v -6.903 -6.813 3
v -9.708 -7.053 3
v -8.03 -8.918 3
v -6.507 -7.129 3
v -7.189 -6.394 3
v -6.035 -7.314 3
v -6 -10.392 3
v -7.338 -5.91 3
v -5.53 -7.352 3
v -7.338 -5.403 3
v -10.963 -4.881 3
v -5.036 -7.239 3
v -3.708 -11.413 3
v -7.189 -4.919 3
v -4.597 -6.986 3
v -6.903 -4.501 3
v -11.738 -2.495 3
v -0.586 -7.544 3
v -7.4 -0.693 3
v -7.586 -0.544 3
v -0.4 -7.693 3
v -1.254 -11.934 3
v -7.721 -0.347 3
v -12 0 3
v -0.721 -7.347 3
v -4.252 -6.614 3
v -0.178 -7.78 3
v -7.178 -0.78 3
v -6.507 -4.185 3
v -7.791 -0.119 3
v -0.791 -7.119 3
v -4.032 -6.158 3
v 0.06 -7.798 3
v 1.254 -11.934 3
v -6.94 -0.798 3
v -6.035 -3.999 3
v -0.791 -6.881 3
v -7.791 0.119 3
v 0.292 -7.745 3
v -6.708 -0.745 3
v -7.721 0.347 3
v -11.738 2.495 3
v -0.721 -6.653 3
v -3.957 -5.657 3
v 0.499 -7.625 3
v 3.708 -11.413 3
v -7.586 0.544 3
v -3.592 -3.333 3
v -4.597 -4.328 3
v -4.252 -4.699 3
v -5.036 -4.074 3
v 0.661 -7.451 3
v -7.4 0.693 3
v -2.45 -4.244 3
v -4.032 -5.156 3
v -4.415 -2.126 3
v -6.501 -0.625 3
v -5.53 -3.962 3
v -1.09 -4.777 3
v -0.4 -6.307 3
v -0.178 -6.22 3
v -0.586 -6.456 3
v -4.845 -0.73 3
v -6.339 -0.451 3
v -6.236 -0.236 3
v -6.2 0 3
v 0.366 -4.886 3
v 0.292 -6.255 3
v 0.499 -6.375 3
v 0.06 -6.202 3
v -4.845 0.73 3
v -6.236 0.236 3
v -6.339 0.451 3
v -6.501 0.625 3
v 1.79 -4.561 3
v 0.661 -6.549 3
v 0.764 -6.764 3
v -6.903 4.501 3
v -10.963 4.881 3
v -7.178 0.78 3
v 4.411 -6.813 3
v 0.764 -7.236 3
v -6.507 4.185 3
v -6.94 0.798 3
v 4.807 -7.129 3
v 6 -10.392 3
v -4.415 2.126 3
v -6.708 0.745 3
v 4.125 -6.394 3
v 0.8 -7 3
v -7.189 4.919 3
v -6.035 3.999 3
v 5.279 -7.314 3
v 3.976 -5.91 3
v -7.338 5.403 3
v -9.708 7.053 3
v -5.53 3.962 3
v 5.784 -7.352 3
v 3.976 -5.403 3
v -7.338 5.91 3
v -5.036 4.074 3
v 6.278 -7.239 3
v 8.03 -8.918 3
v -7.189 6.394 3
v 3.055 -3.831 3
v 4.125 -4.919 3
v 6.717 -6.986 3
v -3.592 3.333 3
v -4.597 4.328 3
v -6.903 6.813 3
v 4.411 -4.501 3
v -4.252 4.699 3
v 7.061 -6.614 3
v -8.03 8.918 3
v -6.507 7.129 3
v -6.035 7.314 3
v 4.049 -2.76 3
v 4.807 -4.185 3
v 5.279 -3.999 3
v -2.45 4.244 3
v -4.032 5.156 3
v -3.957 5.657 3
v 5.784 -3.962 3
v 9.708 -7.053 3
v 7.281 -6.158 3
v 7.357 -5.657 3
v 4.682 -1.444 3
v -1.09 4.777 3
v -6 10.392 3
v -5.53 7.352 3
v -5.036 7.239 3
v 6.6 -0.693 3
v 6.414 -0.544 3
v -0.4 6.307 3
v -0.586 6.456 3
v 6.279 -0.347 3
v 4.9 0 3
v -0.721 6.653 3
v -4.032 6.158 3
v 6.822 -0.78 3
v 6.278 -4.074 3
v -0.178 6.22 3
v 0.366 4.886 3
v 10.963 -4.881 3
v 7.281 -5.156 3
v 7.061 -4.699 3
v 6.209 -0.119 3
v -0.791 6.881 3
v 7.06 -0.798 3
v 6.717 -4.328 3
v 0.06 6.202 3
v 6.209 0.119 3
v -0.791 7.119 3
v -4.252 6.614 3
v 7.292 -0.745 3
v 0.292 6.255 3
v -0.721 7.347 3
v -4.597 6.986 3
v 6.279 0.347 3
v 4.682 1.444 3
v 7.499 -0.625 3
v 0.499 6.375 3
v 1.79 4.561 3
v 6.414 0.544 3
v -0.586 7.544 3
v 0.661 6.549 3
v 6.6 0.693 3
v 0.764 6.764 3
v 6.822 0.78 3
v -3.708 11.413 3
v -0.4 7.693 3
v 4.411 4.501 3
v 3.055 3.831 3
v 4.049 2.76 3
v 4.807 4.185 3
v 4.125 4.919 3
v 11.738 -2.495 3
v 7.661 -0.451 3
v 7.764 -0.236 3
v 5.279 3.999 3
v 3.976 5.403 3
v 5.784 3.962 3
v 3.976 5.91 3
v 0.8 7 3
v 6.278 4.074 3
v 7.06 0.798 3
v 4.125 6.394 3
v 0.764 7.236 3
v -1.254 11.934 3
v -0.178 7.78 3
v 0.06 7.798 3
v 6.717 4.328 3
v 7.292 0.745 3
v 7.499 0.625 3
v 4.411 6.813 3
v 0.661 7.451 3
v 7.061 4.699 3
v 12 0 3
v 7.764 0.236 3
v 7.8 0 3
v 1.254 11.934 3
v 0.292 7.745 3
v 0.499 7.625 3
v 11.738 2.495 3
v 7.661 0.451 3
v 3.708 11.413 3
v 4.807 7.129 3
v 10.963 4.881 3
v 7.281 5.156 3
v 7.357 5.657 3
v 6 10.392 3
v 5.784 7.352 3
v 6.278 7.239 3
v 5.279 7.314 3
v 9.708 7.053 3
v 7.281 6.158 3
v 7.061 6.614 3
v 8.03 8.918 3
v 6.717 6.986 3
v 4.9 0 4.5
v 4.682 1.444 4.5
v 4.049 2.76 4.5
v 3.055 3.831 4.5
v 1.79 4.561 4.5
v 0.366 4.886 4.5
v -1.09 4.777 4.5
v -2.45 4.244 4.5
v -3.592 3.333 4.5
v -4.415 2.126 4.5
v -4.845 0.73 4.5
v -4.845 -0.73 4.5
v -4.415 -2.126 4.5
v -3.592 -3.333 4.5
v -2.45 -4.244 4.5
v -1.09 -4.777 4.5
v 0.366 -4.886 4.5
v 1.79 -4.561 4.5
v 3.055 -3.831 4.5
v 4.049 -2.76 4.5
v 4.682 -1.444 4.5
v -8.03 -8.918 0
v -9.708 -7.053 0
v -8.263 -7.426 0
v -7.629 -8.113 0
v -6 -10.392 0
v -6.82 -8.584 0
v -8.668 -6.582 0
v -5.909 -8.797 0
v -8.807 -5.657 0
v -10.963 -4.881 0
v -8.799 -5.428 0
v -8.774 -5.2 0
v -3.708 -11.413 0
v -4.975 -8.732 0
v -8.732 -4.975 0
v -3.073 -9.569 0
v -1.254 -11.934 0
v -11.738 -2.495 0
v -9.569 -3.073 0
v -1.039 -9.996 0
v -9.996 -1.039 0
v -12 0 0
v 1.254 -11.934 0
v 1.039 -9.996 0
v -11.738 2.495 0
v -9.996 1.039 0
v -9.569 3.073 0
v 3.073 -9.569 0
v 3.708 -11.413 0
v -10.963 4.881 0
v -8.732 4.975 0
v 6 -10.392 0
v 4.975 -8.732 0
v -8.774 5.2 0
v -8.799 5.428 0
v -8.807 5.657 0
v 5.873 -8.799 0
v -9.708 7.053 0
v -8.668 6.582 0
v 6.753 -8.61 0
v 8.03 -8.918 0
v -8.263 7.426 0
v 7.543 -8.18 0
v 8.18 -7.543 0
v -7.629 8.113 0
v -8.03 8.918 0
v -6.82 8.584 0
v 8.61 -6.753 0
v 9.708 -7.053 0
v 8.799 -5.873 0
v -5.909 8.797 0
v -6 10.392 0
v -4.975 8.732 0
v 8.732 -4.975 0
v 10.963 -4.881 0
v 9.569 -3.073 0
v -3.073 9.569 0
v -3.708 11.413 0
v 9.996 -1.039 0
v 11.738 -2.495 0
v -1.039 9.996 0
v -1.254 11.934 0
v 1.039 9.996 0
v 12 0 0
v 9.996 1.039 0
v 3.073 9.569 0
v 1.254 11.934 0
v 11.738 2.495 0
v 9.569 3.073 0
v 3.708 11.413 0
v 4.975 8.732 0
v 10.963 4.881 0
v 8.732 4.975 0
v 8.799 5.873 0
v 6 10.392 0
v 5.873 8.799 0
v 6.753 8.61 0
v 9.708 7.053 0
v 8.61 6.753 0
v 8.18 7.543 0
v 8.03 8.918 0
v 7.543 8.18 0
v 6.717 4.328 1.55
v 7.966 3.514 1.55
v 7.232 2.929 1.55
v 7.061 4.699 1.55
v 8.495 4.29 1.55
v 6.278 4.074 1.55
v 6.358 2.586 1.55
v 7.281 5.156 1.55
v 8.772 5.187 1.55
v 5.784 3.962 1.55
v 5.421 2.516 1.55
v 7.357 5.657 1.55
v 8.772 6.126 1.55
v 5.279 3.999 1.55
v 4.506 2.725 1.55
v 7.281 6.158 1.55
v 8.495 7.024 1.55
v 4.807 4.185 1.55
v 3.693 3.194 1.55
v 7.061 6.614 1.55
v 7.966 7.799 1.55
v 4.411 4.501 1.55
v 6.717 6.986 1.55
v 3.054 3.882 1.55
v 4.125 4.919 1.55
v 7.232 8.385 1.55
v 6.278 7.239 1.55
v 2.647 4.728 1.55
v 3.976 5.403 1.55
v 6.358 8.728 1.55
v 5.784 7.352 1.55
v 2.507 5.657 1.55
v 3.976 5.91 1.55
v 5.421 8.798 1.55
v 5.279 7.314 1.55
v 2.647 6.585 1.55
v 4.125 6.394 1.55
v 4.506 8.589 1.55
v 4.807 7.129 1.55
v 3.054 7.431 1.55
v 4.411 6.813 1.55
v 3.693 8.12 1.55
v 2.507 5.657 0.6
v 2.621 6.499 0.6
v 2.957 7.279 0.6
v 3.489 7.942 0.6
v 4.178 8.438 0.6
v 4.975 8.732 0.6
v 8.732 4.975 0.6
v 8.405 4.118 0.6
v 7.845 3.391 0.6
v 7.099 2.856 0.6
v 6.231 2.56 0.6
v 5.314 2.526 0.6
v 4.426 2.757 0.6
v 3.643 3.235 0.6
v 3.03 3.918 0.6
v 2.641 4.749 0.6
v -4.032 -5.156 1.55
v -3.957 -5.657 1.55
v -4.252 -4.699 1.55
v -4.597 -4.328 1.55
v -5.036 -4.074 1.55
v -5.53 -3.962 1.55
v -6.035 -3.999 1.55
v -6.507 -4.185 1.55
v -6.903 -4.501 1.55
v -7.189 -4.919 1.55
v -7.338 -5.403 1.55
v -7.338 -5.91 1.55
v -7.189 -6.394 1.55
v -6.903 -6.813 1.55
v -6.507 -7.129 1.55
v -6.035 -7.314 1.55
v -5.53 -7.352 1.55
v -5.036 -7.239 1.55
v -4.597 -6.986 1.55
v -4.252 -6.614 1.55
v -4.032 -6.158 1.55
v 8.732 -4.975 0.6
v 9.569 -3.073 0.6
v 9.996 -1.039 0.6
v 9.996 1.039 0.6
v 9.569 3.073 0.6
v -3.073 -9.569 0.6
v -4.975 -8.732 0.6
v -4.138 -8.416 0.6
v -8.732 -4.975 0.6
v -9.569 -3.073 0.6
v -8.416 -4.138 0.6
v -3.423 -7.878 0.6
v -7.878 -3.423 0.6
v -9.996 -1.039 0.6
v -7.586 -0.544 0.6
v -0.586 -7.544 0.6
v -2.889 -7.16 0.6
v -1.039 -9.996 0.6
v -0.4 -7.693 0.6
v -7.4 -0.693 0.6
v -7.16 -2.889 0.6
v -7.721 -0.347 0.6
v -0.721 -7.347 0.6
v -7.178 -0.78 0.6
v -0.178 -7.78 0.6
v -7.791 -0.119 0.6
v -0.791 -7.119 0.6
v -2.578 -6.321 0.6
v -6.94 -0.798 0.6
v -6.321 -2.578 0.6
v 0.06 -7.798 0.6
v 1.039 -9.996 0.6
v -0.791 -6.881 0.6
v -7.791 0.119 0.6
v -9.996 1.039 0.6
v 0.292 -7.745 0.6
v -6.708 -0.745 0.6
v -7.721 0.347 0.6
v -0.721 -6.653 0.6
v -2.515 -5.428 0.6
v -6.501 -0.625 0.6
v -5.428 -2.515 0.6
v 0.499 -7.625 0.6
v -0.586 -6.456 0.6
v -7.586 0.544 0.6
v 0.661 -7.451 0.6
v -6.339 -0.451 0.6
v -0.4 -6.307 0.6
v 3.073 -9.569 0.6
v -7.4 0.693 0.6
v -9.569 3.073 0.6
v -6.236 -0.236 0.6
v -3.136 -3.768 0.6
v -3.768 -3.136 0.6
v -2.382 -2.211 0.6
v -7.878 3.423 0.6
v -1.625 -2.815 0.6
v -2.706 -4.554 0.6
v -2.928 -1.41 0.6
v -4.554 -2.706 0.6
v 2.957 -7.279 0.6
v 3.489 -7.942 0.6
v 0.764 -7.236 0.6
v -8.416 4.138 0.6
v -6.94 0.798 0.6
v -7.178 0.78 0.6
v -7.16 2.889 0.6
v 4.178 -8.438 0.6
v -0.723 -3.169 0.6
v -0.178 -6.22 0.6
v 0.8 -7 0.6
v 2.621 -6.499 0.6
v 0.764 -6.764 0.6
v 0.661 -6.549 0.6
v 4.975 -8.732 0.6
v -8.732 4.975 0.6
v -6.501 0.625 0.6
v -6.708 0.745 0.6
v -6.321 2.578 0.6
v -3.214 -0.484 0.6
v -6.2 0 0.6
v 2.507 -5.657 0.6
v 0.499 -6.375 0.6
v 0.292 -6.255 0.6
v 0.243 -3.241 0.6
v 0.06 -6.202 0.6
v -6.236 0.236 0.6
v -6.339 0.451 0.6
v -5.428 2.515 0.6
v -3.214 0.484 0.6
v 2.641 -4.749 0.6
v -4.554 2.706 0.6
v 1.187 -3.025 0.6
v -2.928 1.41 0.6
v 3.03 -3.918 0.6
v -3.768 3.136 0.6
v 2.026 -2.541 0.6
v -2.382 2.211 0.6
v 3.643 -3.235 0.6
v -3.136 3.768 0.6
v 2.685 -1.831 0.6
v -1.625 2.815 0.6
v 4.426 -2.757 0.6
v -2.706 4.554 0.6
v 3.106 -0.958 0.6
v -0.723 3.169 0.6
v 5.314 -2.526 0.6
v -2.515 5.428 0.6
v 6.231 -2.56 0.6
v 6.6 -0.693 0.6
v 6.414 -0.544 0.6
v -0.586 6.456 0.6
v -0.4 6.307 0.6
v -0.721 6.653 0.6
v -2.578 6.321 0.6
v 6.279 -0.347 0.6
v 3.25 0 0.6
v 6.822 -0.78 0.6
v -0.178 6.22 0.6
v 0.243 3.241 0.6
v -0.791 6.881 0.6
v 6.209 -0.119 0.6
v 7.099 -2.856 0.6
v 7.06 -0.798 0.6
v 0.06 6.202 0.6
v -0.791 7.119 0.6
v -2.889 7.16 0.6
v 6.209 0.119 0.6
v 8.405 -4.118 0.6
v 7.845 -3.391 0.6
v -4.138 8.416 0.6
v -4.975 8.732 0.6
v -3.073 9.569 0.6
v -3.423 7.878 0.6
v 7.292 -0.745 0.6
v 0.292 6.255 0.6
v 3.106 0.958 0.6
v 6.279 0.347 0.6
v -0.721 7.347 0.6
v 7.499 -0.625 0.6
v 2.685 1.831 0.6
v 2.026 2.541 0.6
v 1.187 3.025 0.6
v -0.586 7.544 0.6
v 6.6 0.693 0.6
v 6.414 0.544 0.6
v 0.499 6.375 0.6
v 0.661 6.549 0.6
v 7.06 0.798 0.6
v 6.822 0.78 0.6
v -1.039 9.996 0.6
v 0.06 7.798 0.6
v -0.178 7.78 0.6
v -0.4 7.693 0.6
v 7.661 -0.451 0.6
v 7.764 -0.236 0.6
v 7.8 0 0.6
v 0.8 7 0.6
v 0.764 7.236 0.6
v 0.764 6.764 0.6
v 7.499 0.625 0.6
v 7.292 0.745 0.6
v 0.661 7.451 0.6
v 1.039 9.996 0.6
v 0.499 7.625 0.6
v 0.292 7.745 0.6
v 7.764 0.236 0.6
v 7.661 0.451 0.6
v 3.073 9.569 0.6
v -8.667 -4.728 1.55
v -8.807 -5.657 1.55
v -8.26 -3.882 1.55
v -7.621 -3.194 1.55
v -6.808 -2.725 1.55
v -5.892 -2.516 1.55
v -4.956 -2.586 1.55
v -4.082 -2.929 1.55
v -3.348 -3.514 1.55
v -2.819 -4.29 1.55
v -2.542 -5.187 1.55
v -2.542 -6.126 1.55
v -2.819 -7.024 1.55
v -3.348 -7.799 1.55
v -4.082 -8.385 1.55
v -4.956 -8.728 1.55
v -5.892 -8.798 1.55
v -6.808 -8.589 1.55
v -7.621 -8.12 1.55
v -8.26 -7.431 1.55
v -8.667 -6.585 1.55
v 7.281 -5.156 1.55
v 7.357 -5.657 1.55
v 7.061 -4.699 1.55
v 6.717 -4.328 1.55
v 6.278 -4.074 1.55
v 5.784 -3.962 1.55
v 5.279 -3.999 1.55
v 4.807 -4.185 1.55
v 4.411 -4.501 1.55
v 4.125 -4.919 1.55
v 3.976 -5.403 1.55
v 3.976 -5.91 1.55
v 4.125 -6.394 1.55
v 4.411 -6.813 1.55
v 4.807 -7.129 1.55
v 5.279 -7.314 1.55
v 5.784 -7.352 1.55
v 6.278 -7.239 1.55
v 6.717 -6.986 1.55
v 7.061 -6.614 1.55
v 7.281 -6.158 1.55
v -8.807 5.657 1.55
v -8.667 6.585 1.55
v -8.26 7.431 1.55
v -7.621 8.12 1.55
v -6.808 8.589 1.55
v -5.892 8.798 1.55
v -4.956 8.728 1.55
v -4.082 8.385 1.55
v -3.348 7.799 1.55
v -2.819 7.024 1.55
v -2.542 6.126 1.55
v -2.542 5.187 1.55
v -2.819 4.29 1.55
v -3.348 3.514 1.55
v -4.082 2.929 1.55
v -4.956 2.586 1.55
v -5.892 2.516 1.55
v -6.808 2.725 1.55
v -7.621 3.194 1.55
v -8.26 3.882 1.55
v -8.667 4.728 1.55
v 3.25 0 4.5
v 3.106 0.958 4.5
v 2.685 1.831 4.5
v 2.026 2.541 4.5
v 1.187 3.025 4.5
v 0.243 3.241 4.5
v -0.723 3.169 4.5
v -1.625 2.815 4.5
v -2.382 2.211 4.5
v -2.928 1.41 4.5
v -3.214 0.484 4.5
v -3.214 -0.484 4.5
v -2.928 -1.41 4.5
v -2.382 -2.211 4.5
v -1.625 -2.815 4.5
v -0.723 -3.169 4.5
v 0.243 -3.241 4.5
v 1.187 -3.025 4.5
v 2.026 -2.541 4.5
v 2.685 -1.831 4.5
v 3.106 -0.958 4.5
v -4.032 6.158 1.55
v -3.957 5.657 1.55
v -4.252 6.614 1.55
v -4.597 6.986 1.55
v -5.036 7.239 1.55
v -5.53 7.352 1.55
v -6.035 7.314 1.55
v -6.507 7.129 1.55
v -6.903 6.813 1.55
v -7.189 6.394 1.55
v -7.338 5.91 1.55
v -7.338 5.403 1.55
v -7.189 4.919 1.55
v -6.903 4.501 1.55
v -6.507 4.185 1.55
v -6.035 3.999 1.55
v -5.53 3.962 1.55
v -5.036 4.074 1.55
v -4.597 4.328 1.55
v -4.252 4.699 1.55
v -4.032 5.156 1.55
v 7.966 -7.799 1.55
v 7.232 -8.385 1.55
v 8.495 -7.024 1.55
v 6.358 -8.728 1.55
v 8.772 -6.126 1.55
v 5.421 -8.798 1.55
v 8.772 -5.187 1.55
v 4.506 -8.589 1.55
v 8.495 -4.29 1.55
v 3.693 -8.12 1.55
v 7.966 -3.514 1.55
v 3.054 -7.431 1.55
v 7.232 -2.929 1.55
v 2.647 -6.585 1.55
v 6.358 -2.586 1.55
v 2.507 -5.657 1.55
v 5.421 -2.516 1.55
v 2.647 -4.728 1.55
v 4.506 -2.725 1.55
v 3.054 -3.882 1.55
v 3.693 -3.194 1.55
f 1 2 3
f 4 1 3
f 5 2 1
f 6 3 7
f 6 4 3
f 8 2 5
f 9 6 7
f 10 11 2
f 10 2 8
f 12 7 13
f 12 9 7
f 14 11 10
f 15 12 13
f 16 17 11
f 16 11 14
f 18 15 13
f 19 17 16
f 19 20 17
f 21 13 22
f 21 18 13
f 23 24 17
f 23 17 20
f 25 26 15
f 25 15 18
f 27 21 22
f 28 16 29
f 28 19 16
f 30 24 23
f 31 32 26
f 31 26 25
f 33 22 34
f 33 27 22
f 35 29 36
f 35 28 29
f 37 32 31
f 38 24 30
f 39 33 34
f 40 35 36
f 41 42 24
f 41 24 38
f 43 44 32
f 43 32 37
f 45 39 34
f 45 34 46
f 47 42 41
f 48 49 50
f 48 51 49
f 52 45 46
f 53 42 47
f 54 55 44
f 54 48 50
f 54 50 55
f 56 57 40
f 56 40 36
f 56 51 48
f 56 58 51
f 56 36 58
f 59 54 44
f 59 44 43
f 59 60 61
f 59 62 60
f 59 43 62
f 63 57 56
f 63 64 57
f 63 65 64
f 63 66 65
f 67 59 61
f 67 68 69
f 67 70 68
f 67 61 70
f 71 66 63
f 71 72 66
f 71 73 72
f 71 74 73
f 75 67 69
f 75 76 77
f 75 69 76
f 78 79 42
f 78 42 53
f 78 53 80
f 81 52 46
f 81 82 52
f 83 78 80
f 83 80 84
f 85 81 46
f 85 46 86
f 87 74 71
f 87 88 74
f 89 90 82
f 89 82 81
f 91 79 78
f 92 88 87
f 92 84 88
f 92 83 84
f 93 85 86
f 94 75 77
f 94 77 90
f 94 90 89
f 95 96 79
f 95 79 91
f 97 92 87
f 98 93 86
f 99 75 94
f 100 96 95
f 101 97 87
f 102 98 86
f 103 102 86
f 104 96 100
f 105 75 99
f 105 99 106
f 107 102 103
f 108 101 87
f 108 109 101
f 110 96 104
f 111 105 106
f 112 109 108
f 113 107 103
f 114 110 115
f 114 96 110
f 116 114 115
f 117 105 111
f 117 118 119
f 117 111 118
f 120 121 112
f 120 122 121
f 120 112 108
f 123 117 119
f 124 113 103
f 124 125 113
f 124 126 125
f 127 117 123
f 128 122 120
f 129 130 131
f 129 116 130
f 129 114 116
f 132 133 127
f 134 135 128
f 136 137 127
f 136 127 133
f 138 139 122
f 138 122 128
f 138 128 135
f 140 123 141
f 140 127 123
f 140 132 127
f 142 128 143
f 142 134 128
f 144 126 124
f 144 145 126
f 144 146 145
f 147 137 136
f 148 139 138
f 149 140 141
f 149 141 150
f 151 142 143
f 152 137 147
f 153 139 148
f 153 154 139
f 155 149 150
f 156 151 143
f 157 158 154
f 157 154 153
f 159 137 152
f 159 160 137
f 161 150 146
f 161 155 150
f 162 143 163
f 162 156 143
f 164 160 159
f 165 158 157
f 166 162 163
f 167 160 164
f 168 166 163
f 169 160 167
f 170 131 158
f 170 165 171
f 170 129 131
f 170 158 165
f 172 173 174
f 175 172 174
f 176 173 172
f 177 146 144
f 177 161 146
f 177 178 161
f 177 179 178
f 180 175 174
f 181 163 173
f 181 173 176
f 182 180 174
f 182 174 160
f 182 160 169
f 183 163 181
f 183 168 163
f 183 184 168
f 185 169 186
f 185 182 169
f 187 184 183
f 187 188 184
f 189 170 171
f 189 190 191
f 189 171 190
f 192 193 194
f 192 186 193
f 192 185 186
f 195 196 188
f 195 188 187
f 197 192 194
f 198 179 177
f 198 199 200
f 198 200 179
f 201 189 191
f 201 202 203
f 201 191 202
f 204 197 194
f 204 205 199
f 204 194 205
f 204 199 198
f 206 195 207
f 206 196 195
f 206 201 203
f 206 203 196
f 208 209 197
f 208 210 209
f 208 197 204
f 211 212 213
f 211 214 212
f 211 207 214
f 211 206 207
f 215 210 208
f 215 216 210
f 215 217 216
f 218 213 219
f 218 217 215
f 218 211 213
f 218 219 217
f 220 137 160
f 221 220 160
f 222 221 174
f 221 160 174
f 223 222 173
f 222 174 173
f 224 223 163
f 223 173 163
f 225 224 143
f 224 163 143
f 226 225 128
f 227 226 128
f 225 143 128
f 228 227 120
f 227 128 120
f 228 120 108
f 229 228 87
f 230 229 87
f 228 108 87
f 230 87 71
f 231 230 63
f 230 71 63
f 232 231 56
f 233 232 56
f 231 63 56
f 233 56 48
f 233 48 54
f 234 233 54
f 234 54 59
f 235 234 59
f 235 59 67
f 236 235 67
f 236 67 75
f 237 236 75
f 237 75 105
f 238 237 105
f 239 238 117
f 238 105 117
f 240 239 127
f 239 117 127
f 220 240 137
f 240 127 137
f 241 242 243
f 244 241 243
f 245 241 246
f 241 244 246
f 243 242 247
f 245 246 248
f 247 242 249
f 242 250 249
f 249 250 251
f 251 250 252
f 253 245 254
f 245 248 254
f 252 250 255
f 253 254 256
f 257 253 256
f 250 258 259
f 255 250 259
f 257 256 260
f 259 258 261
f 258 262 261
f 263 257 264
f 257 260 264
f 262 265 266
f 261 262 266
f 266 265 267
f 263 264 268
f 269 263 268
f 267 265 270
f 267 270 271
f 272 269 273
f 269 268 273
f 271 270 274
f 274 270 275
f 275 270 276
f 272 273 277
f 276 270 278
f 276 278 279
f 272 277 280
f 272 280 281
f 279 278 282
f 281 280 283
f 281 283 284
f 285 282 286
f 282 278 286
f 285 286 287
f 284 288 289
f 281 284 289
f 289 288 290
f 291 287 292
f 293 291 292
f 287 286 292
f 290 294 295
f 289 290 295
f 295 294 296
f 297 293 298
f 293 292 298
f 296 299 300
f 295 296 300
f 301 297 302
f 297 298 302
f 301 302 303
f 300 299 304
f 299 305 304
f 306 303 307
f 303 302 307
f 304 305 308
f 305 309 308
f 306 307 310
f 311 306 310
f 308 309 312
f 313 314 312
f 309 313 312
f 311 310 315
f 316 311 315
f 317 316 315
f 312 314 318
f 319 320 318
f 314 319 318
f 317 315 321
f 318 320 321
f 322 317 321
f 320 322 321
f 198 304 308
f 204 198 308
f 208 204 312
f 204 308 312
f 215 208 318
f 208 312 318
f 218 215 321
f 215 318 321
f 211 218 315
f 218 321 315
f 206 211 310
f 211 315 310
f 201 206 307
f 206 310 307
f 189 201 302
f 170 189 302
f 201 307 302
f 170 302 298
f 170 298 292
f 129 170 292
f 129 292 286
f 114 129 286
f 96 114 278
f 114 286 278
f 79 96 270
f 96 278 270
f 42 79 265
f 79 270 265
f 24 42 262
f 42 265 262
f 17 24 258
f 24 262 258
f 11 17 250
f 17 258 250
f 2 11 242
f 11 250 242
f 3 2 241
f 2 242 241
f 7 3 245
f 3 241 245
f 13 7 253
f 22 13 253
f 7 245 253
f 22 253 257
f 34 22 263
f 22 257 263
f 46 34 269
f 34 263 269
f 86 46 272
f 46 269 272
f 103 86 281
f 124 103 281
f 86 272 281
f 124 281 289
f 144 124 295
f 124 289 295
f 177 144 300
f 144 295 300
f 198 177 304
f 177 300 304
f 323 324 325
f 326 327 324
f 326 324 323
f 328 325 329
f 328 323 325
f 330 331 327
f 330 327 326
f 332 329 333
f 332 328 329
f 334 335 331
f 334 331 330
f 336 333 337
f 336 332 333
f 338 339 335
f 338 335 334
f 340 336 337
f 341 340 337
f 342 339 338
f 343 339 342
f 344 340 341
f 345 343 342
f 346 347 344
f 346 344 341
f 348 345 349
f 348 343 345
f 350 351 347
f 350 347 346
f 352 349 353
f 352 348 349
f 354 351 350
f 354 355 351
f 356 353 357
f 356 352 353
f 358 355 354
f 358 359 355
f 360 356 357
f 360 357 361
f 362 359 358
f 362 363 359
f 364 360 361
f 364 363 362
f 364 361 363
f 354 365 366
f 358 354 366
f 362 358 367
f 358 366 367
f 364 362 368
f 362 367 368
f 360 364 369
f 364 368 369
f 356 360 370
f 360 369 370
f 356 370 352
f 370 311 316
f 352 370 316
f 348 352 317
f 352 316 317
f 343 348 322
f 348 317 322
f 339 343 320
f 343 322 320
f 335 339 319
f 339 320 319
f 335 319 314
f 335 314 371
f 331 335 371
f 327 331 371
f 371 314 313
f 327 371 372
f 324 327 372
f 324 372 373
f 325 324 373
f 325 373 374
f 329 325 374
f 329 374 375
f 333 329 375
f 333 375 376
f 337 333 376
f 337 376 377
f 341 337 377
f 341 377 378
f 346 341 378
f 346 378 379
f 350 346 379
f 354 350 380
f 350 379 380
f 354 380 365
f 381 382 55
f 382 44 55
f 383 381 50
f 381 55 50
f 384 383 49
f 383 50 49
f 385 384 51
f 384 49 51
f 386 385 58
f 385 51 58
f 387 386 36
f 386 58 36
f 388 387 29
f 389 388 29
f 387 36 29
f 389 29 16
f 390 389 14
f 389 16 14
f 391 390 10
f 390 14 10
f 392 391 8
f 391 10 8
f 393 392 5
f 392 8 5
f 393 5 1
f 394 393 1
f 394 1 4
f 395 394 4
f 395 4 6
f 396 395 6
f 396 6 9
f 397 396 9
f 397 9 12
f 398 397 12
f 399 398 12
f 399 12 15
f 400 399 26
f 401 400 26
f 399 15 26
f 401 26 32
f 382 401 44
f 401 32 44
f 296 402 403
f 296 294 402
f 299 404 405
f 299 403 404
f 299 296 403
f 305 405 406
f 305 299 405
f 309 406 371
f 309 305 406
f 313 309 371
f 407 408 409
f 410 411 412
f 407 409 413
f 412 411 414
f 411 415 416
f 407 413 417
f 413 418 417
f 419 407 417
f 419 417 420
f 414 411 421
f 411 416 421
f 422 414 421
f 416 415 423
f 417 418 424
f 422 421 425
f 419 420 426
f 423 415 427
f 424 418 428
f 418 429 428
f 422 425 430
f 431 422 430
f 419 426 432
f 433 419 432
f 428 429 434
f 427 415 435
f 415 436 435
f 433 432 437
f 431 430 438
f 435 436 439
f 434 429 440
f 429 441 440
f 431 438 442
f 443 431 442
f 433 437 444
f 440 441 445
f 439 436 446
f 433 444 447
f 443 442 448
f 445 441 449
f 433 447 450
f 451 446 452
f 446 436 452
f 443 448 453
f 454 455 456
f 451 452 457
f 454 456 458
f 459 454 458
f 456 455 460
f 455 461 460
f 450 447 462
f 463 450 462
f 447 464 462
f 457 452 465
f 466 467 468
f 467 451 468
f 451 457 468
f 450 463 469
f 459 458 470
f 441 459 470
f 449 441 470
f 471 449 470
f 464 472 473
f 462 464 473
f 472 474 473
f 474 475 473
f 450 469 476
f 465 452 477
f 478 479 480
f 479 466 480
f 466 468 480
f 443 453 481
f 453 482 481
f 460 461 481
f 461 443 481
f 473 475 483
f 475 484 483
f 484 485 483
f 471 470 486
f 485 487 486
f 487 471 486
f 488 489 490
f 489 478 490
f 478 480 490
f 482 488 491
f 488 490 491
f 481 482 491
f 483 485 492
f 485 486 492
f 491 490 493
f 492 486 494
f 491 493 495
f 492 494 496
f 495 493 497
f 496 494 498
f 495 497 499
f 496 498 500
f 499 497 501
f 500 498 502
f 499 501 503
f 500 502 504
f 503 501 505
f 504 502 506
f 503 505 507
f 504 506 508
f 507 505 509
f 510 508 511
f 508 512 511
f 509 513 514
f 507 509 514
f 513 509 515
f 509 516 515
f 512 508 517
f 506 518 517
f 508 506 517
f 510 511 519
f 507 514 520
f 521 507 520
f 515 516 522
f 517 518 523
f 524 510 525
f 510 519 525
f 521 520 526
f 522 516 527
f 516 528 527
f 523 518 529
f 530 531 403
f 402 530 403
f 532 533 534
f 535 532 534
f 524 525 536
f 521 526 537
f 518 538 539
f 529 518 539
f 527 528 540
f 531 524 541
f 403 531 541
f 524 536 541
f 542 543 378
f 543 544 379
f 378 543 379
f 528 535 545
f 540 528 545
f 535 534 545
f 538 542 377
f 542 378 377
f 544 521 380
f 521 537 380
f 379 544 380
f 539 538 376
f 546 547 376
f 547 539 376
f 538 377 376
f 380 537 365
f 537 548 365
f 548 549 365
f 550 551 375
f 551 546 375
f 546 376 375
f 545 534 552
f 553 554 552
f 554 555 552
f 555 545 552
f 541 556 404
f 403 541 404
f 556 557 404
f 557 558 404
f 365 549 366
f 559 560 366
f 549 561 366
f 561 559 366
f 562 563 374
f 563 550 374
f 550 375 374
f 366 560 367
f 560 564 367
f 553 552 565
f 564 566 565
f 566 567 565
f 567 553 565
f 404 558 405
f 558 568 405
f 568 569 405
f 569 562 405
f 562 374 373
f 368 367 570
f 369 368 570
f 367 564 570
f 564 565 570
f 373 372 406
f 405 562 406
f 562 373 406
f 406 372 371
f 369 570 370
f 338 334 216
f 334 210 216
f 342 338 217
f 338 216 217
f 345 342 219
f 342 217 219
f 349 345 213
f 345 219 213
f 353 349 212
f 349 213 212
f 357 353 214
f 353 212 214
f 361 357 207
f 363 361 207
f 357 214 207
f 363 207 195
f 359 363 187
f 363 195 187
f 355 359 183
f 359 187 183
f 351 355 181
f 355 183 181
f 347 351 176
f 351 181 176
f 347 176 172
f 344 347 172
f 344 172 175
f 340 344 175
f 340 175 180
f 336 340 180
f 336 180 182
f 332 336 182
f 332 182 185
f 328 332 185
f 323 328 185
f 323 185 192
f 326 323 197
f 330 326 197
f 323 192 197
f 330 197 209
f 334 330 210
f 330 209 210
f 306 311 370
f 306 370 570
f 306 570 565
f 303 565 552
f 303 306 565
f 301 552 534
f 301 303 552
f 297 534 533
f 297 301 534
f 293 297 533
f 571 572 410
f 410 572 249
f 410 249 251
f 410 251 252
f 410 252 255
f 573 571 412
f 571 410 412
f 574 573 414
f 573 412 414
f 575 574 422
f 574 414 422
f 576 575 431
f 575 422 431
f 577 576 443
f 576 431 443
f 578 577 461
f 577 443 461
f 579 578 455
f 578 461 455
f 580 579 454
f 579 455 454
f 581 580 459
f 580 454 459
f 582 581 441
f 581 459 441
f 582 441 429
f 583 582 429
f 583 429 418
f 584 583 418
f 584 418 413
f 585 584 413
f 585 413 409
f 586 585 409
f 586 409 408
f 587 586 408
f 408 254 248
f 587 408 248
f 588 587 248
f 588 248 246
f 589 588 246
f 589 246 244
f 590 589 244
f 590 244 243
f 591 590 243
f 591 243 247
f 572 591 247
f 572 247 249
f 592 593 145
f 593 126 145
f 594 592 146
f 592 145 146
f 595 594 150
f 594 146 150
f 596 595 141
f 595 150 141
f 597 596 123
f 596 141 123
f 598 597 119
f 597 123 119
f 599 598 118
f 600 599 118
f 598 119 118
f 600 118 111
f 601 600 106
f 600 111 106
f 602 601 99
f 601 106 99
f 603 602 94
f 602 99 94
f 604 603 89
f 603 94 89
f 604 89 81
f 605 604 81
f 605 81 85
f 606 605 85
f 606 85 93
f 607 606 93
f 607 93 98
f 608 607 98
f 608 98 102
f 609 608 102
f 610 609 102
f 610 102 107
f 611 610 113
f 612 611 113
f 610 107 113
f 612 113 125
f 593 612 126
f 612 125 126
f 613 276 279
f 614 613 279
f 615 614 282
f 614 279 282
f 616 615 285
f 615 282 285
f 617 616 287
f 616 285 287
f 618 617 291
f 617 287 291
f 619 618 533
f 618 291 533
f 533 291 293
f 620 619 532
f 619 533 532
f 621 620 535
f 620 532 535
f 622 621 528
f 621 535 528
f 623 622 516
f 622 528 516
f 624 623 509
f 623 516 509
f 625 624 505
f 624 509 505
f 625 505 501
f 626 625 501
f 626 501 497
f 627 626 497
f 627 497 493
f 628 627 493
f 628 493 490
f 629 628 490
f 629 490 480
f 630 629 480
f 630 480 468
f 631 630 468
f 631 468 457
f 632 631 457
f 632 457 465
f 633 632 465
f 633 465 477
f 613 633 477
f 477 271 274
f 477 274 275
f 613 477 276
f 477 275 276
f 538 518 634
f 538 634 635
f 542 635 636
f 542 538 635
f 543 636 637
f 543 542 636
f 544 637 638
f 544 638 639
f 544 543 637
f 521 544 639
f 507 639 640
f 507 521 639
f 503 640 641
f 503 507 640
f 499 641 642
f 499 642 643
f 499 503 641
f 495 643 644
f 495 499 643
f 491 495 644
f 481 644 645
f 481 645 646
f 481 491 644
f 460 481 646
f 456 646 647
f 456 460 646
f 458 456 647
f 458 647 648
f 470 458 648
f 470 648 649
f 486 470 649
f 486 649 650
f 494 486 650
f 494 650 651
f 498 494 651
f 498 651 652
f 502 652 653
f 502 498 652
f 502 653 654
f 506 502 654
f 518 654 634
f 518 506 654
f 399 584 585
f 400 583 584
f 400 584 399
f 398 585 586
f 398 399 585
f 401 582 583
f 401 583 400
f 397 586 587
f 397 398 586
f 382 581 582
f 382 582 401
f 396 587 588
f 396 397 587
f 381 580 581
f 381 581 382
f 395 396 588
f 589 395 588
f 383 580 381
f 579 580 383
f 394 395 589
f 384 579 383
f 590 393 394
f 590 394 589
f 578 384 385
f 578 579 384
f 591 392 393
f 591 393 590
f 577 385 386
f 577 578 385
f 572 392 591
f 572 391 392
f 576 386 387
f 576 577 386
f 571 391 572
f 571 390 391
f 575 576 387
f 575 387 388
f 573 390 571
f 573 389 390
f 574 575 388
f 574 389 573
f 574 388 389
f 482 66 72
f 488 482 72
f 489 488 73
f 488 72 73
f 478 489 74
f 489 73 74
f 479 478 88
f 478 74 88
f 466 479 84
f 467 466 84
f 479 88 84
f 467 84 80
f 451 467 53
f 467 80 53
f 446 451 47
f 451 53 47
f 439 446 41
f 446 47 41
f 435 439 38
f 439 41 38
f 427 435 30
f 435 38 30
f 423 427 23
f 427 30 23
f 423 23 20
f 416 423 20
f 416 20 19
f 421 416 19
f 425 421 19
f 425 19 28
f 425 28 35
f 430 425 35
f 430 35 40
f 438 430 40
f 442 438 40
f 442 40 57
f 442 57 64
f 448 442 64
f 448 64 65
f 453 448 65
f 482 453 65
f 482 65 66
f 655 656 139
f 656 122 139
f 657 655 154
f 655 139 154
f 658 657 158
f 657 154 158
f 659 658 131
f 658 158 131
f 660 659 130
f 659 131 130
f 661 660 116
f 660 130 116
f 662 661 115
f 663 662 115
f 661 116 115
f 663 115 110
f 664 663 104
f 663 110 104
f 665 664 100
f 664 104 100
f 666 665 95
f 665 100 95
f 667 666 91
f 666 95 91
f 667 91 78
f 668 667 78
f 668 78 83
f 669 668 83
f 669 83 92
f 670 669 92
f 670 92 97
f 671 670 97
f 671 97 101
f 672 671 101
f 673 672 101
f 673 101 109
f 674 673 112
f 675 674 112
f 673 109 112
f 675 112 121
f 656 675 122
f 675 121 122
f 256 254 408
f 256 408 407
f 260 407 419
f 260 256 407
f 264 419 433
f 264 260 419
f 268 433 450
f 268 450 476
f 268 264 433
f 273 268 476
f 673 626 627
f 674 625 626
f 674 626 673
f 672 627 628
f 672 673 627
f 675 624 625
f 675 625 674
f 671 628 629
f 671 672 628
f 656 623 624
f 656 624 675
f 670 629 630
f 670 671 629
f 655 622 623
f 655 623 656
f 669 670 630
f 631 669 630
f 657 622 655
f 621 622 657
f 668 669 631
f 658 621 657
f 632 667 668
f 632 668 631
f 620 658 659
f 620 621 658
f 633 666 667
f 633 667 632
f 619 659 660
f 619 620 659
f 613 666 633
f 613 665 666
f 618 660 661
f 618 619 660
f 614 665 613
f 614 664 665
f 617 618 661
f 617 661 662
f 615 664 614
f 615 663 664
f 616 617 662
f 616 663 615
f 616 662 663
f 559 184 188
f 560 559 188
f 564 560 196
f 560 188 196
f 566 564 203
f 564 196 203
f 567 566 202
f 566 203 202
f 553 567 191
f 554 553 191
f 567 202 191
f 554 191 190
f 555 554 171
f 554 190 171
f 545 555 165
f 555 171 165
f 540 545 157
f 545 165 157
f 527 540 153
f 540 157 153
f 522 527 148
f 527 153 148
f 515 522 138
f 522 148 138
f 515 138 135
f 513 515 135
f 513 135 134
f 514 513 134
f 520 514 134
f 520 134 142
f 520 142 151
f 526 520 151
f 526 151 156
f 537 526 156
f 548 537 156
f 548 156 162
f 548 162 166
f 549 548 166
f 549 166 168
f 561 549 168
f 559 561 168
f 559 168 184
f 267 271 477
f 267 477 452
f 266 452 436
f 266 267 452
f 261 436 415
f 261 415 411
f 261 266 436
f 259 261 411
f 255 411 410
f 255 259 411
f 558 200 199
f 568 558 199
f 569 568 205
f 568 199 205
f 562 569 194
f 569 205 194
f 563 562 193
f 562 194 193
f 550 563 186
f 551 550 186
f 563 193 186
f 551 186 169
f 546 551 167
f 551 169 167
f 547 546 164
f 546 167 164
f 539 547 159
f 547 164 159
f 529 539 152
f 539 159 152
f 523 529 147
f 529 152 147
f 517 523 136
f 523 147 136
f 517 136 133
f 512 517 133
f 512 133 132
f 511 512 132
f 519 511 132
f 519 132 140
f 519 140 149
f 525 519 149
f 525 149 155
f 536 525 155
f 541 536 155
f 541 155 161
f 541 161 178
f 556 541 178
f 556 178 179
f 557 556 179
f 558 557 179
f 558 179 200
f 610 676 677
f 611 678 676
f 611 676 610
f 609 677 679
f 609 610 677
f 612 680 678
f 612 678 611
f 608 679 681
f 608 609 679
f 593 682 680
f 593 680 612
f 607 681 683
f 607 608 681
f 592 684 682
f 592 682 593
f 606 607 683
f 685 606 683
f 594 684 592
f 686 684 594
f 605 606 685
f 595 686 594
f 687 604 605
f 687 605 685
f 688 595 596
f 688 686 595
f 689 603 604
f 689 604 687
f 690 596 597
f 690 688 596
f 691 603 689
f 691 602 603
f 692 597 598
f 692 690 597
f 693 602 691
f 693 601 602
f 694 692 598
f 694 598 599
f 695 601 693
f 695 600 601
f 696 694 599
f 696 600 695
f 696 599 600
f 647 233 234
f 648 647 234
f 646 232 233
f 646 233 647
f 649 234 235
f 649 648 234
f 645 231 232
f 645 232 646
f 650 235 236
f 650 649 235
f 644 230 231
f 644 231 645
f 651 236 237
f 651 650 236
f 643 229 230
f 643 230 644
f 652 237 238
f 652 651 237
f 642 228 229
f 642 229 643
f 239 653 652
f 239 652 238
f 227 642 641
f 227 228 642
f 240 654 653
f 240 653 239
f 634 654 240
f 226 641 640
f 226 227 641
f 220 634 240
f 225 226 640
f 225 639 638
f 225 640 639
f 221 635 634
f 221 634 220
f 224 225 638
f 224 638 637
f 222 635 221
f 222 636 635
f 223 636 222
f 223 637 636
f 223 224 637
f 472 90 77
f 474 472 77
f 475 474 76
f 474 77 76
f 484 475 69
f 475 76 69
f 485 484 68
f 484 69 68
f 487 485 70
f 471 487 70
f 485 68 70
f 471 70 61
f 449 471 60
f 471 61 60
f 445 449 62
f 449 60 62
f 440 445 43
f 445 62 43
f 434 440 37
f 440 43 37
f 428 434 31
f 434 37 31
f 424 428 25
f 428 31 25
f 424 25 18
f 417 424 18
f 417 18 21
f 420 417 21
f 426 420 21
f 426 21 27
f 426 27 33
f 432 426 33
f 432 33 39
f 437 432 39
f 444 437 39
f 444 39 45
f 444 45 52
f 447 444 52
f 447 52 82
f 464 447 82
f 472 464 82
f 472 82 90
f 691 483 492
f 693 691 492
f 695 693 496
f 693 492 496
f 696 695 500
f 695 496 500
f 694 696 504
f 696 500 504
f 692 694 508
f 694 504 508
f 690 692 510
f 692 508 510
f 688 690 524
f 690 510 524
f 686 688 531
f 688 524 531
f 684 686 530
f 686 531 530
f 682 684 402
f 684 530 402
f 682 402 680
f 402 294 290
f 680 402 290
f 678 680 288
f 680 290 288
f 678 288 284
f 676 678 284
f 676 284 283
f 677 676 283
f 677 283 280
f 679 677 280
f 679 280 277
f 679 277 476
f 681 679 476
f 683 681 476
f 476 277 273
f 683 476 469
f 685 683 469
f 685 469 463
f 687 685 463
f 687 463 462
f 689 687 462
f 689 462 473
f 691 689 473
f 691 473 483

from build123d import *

# Parameters (mm, degrees)
D24_D6_5_R                      = 12
D24_D6_5_R_2                    = 3.25
D24_3_D6_5_DEPTH                = 3
EXTRUDE_START                   = 3
SKETCH_D9_8_1_5_R               = 4.9
SKETCH_D9_8_1_5_R_2             = 3.25
EXTRUDE_D9_8_1_5_DEPTH          = 1.5
F_4XD3_4_D6_3_PCD16_D           = 3.4
F_4XD3_4_D6_3_PCD16_CBORE_D     = 6.3
F_4XD3_4_D6_3_PCD16_CBORE_DEPTH = 1.55
SKETCH_1093_R                   = 10.05
CUT_EXTRUDE_D20_1_0_6_DEPTH     = 0.6
F_4XM2X0_4_PCD14_D              = 1.6


with BuildPart() as part:
    # 转接板_D24_工具通孔D6.5_截面 → 转接板_D24_厚3_工具通孔D6.5 (new body)
    with BuildSketch(Plane.XY):
        Circle(D24_D6_5_R)
        Circle(D24_D6_5_R_2, mode=Mode.SUBTRACT)
    extrude(amount=D24_3_D6_5_DEPTH)

    # 轴承内孔定位台_D9.8_高1.5_截面 → 轴承内孔定位台_D9.8_高1.5 (add)
    with BuildSketch(Plane.XY.offset(EXTRUDE_START)):
        Circle(SKETCH_D9_8_1_5_R)
        Circle(SKETCH_D9_8_1_5_R_2, mode=Mode.SUBTRACT)
    extrude(amount=EXTRUDE_D9_8_1_5_DEPTH)

    # 轴承内圈_4xD3.4通孔_D6.3平底沉孔_PCD16 (through all)
    with Locations(Plane(origin=(5.656854249, -5.656854249, 0), x_dir=(-1, 0, 0), z_dir=(0, 0, -1))):
        with Locations((0, 0), (11.313708498, 0), (11.313708498, 11.313708498), (0, 11.313708498)):
            CounterBoreHole(F_4XD3_4_D6_3_PCD16_D / 2, F_4XD3_4_D6_3_PCD16_CBORE_D / 2, F_4XD3_4_D6_3_PCD16_CBORE_DEPTH)

    # Sketch 1093 → 原舵盘定位槽_D20.1_深0.6 (cut)
    with BuildSketch(Plane.XY):
        Circle(SKETCH_1093_R)
    extrude(amount=CUT_EXTRUDE_D20_1_0_6_DEPTH, mode=Mode.SUBTRACT)

    # 原舵盘_4xM2x0.4通螺纹_PCD14 (through all)
    with Locations(Plane(origin=(0, -7, 0.6), x_dir=(-1, 0, 0), z_dir=(0, 0, -1))):
        with Locations((0, 0), (7, 7), (0, 14), (-7, 7)):
            Hole(F_4XM2X0_4_PCD14_D / 2)


solid = part.part
